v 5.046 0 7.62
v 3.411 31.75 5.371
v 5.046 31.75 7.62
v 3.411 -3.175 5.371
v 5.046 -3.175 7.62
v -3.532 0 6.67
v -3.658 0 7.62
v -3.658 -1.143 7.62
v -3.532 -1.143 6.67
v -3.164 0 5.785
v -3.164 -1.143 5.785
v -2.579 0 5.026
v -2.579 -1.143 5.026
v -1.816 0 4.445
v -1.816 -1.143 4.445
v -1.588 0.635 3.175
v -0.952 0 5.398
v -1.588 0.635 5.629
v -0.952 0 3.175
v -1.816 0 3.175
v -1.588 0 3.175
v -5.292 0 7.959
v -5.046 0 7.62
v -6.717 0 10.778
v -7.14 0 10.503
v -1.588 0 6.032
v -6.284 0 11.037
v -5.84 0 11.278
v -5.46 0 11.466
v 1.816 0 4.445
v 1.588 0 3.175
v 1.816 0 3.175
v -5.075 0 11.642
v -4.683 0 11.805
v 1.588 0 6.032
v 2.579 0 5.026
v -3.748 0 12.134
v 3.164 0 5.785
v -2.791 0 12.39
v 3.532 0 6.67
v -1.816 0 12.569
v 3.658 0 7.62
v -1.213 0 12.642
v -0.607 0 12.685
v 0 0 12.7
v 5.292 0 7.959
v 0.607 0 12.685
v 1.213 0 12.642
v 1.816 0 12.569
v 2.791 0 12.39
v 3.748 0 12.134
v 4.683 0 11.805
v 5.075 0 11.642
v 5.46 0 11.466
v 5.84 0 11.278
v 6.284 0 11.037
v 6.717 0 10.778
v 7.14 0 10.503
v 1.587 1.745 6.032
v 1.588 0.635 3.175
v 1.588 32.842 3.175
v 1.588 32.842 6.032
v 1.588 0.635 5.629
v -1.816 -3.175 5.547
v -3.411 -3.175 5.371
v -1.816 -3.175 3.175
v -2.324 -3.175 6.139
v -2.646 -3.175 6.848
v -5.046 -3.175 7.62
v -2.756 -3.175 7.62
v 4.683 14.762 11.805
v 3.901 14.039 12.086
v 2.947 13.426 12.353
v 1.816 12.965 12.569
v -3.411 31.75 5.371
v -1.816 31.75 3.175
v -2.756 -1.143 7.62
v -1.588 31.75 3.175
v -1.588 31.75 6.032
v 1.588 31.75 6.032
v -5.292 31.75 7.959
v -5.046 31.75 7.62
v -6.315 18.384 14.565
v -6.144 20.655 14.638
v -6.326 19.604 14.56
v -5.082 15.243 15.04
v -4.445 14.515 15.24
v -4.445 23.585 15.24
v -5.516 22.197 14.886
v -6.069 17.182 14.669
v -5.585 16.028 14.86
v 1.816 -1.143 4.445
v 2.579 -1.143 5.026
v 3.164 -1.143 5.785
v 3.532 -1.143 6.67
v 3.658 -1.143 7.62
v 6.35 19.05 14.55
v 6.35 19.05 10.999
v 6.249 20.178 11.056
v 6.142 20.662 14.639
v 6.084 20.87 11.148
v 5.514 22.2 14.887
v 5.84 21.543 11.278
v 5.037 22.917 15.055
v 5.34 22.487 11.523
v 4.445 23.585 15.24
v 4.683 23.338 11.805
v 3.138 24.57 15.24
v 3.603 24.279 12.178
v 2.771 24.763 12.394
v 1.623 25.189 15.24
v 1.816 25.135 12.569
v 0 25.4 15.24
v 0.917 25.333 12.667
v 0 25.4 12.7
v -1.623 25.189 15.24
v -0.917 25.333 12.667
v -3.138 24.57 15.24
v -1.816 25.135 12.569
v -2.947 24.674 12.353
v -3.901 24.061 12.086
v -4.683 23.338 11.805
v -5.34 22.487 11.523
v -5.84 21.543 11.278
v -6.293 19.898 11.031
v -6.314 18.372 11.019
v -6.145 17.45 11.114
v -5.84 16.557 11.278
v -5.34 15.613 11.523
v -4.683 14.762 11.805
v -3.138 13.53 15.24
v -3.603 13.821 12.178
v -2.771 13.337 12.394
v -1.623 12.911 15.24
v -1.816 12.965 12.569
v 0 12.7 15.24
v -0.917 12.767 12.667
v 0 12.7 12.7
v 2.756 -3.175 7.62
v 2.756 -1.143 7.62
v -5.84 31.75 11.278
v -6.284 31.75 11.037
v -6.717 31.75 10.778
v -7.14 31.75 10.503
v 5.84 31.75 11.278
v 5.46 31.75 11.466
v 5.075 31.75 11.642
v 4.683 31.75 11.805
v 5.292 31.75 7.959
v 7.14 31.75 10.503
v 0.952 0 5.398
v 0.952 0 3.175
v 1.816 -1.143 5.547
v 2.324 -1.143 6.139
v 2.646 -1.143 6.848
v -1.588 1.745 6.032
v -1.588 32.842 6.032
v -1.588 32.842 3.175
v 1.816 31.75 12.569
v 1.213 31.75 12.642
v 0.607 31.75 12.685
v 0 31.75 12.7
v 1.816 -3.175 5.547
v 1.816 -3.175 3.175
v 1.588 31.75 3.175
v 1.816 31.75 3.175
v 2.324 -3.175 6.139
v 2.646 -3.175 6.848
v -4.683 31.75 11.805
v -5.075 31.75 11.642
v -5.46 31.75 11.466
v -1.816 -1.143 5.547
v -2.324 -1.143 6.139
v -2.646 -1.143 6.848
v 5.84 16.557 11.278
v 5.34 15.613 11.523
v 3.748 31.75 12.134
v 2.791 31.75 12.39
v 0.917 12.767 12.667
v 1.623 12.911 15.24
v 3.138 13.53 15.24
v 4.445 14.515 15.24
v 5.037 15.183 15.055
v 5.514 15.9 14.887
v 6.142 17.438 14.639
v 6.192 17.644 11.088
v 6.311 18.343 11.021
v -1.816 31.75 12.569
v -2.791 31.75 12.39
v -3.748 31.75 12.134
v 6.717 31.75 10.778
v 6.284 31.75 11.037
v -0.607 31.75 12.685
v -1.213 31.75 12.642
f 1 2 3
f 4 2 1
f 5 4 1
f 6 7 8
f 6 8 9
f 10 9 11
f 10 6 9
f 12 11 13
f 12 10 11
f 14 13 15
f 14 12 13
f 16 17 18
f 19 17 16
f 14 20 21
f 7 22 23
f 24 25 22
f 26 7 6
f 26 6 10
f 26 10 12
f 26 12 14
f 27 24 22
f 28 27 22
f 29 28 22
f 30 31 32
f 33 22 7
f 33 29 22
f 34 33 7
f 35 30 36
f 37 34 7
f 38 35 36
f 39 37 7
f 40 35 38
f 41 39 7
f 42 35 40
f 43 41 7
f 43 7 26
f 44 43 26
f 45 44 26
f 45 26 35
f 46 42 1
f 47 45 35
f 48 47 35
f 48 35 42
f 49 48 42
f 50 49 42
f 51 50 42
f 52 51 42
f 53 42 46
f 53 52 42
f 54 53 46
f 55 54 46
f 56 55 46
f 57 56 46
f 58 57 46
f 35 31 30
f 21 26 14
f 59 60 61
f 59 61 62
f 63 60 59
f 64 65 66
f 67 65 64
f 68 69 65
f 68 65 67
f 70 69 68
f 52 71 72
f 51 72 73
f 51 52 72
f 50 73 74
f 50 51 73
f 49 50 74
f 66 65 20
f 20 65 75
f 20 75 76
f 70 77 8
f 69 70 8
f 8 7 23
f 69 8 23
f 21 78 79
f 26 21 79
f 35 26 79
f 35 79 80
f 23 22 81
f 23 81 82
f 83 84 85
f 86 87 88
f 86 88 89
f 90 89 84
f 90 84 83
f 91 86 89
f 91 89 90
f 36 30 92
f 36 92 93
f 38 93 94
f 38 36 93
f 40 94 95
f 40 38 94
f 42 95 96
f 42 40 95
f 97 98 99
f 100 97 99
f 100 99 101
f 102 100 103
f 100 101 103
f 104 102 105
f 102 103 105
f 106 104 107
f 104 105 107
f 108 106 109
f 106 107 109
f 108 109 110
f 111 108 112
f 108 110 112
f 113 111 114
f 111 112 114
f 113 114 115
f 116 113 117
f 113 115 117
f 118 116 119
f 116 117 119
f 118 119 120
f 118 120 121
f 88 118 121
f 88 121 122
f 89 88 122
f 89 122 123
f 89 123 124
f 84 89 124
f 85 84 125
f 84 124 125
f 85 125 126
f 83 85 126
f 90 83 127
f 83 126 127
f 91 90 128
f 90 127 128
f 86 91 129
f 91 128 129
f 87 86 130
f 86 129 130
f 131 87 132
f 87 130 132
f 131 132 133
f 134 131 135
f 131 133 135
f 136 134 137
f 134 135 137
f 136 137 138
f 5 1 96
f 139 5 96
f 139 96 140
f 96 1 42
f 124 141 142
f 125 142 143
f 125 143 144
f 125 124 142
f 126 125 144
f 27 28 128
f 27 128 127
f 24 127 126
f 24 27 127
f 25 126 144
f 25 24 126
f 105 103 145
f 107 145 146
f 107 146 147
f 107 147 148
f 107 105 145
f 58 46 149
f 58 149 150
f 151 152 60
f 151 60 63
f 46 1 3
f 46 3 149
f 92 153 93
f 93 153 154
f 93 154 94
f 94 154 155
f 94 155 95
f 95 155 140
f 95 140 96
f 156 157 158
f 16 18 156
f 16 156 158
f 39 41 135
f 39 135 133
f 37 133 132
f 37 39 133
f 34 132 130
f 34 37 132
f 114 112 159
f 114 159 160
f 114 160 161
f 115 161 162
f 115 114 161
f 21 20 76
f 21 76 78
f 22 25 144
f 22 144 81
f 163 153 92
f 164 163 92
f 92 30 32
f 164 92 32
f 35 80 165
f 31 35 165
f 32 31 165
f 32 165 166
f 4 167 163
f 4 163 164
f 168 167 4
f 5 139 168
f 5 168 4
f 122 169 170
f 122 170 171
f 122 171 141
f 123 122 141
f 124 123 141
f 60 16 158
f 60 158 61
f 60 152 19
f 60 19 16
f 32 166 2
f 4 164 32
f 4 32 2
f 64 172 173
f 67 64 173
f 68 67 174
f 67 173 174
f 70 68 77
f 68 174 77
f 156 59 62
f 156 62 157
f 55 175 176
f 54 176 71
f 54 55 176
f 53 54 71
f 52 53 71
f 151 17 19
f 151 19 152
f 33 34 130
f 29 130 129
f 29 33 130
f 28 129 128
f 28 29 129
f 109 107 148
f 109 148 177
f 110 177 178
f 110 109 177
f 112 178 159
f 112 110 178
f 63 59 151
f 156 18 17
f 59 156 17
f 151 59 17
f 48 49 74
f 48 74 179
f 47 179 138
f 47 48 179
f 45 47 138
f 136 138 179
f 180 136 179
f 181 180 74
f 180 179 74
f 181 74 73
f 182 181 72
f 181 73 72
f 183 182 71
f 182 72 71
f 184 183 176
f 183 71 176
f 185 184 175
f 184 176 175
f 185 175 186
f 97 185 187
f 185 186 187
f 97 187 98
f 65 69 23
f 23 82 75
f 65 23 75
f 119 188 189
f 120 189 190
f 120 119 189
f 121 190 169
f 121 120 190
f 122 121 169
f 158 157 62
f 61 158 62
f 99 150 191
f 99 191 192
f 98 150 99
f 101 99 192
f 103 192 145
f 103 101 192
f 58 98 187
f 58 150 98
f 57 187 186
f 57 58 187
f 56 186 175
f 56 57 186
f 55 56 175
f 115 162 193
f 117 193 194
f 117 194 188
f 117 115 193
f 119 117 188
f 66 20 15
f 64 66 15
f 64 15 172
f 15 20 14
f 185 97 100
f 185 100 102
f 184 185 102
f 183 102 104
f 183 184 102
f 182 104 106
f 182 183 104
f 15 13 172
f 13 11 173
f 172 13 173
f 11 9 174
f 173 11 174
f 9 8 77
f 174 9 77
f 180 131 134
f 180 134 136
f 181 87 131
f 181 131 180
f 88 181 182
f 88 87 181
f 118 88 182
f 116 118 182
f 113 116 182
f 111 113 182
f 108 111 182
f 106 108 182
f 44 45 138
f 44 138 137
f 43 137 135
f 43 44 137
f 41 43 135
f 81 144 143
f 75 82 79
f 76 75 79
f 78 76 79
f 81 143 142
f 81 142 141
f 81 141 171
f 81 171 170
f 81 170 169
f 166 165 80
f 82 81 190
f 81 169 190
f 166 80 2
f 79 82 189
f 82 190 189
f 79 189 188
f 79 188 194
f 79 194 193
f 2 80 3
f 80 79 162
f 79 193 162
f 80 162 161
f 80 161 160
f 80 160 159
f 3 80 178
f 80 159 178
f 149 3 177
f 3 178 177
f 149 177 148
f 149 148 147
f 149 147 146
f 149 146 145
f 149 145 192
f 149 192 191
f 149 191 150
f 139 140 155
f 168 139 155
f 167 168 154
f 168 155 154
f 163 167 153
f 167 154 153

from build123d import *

# Parameters (mm, degrees)
F1_DEPTH     = 31.75
F2_DEPTH     = 3.175
F3_DEPTH     = 1.143
F4_DEPTH     = 32.8422
F7_DEPTH     = 5.08
F8_R         = 19.05
F8_R_2       = 15.875
F9_DEPTH     = 50.8
F11_SIZE     = 0.635
F12_T1_DEPTH = 10.9569141407


# Not quite as in the source:
# - a fillet or chamfer that OpenCascade refuses, or shapes differently, is made with other operations: its cross-section is extruded or revolved along the edge and cut away or added


with BuildPart() as f1:
    # F0 (on Front) → F1 (new body)
    with BuildSketch(Plane.XZ):
        with BuildLine():
            Line((-3.96875, 7.62), (-5.0456895848, 7.62))
            Line((-5.0456895848, 7.62), (-3.4113577324, 5.3705351863))
            Line((-3.4113577324, 5.3705351863), (-1.8162080478, 3.175))
            Line((-1.8162080478, 3.175), (-1.8162080478, 4.0912091463))
            ThreePointArc((-1.8162080478, 4.0912091463), (-3.3881449388, 5.5532512402), (-3.96875, 7.62))
        make_face()
        with BuildLine():
            Line((-5.2922131397, 7.9593105639), (-5.0456895848, 7.62))
            Line((-5.0456895848, 7.62), (-3.96875, 7.62))
            ThreePointArc((-3.96875, 7.62), (-3.3881449388, 9.6867487598), (-1.8162080478, 11.1487908537))
            Line((-1.8162080478, 11.1487908537), (-1.8162080478, 11.2776))
            Line((-1.8162080478, 11.2776), (-4.4524904002, 11.2776))
            ThreePointArc((-4.4524904002, 11.2776), (-4.386898372, 9.4956069696), (-5.2922131397, 7.9593105639))
        make_face()
        with BuildLine():
            Line((-1.8162080478, 4.0912091463), (-1.8162080478, 3.175))
            Line((-1.8162080478, 3.175), (-1.5875, 3.175))
            Line((-1.5875, 3.175), (-1.5875, 3.9825805421))
            ThreePointArc((-1.5875, 3.9825805421), (-1.7027205179, 4.0350705167), (-1.8162080478, 4.0912091463))
        make_face()
        with BuildLine():
            Line((3.96875, 7.62), (5.0456895848, 7.62))
            Line((5.0456895848, 7.62), (5.2922131397, 7.9593105639))
            ThreePointArc((5.2922131397, 7.9593105639), (4.386898372, 9.4956069696), (4.4524904002, 11.2776))
            Line((4.4524904002, 11.2776), (1.8162080478, 11.2776))
            Line((1.8162080478, 11.2776), (1.8162080478, 11.1487908537))
            ThreePointArc((1.8162080478, 11.1487908537), (3.3881449388, 9.6867487598), (3.96875, 7.62))
        make_face()
        with BuildLine():
            Line((3.4113577324, 5.3705351863), (5.0456895848, 7.62))
            Line((5.0456895848, 7.62), (3.96875, 7.62))
            ThreePointArc((3.96875, 7.62), (3.3881449388, 5.5532512402), (1.8162080478, 4.0912091463))
            Line((1.8162080478, 4.0912091463), (1.8162080478, 3.175))
            Line((1.8162080478, 3.175), (3.4113577324, 5.3705351863))
        make_face()
        with BuildLine():
            Line((1.5875, 3.175), (1.8162080478, 3.175))
            Line((1.8162080478, 3.175), (1.8162080478, 4.0912091463))
            ThreePointArc((1.8162080478, 4.0912091463), (1.7027205179, 4.0350705167), (1.5875, 3.9825805421))
            Line((1.5875, 3.9825805421), (1.5875, 3.175))
        make_face()
        with BuildLine():
            Line((-7.1401482368, 10.5027750217), (-5.2922131397, 7.9593105639))
            ThreePointArc((-5.2922131397, 7.9593105639), (-4.386898372, 9.4956069696), (-4.4524904002, 11.2776))
            Line((-4.4524904002, 11.2776), (-5.8400118356, 11.2776))
            ThreePointArc((-5.8400118356, 11.2776), (-6.5016326652, 10.9095725254), (-7.1401482368, 10.5027750217))
        make_face()
        with BuildLine():
            Line((-3.6576, 7.62), (-3.96875, 7.62))
            ThreePointArc((-3.96875, 7.62), (-3.3881449388, 5.5532512402), (-1.8162080478, 4.0912091463))
            Line((-1.8162080478, 4.0912091463), (-1.8162080478, 4.4451888108))
            ThreePointArc((-1.8162080478, 4.4451888108), (-3.1639374453, 5.7849148243), (-3.6576, 7.62))
        make_face()
        with BuildLine():
            ThreePointArc((-1.8162080478, 11.1487908537), (-3.3881449388, 9.6867487598), (-3.96875, 7.62))
            Line((-3.96875, 7.62), (-3.6576, 7.62))
            ThreePointArc((-3.6576, 7.62), (-3.1639374453, 9.4550851757), (-1.8162080478, 10.7948111892))
            Line((-1.8162080478, 10.7948111892), (-1.8162080478, 11.1487908537))
        make_face()
        with BuildLine():
            Line((-1.8162080478, 4.4451888108), (-1.8162080478, 4.0912091463))
            ThreePointArc((-1.8162080478, 4.0912091463), (-1.7027205179, 4.0350705167), (-1.5875, 3.9825805421))
            Line((-1.5875, 3.9825805421), (-1.5875, 4.3248700314))
            ThreePointArc((-1.5875, 4.3248700314), (-1.7029169889, 4.3830088834), (-1.8162080478, 4.4451888108))
        make_face()
        with BuildLine():
            ThreePointArc((4.4524904002, 11.2776), (4.386898372, 9.4956069696), (5.2922131397, 7.9593105639))
            Line((5.2922131397, 7.9593105639), (7.1401482368, 10.5027750217))
            ThreePointArc((7.1401482368, 10.5027750217), (6.5016326652, 10.9095725254), (5.8400118356, 11.2776))
            Line((5.8400118356, 11.2776), (4.4524904002, 11.2776))
        make_face()
        with BuildLine():
            Line((3.6576, 7.62), (3.96875, 7.62))
            ThreePointArc((3.96875, 7.62), (3.3881449388, 9.6867487598), (1.8162080478, 11.1487908537))
            Line((1.8162080478, 11.1487908537), (1.8162080478, 10.7948111892))
            ThreePointArc((1.8162080478, 10.7948111892), (3.1639374453, 9.4550851757), (3.6576, 7.62))
        make_face()
        with BuildLine():
            ThreePointArc((1.8162080478, 4.0912091463), (3.3881449388, 5.5532512402), (3.96875, 7.62))
            Line((3.96875, 7.62), (3.6576, 7.62))
            ThreePointArc((3.6576, 7.62), (3.1639374453, 5.7849148243), (1.8162080478, 4.4451888108))
            Line((1.8162080478, 4.4451888108), (1.8162080478, 4.0912091463))
        make_face()
        with BuildLine():
            ThreePointArc((1.5875, 3.9825805421), (1.7027205179, 4.0350705167), (1.8162080478, 4.0912091463))
            Line((1.8162080478, 4.0912091463), (1.8162080478, 4.4451888108))
            ThreePointArc((1.8162080478, 4.4451888108), (1.7029169889, 4.3830088834), (1.5875, 4.3248700314))
            Line((1.5875, 4.3248700314), (1.5875, 3.9825805421))
        make_face()
        with BuildLine():
            ThreePointArc((-4.6831128955, 11.8050181537), (-4.5558242029, 11.5465464169), (-4.4524904002, 11.2776))
            Line((-4.4524904002, 11.2776), (-1.8162080478, 11.2776))
            Line((-1.8162080478, 11.2776), (-1.8162080478, 12.5694625313))
            ThreePointArc((-1.8162080478, 12.5694625313), (-3.2720615799, 12.2712514854), (-4.6831128955, 11.8050181537))
        make_face()
        with BuildLine():
            Line((-5.8400118356, 11.2776), (-4.4524904002, 11.2776))
            ThreePointArc((-4.4524904002, 11.2776), (-4.5558242029, 11.5465464169), (-4.6831128955, 11.8050181537))
            ThreePointArc((-4.6831128955, 11.8050181537), (-5.2681667593, 11.5557959049), (-5.8400118356, 11.2776))
        make_face()
        with BuildLine():
            Line((-1.8162080478, 11.2776), (-1.8162080478, 11.1487908537))
            ThreePointArc((-1.8162080478, 11.1487908537), (-1.6795566201, 11.2158401136), (-1.5404346148, 11.2776))
            Line((-1.5404346148, 11.2776), (-1.8162080478, 11.2776))
        make_face()
        with BuildLine():
            ThreePointArc((-1.5404346148, 11.2776), (-1.6795566201, 11.2158401136), (-1.8162080478, 11.1487908537))
            Line((-1.8162080478, 11.1487908537), (-1.8162080478, 10.7948111892))
            ThreePointArc((-1.8162080478, 10.7948111892), (-0.939640451, 11.1548427946), (0, 11.2776))
            Line((0, 11.2776), (-1.5404346148, 11.2776))
        make_face()
        with BuildLine():
            Line((-2.7559, 7.62), (-3.6576, 7.62))
            ThreePointArc((-3.6576, 7.62), (-3.1639374453, 5.7849148243), (-1.8162080478, 4.4451888108))
            Line((-1.8162080478, 4.4451888108), (-1.8162080478, 5.5472305635))
            ThreePointArc((-1.8162080478, 5.5472305635), (-2.510007228, 6.4820858884), (-2.7559, 7.62))
        make_face()
        with BuildLine():
            ThreePointArc((-1.8162080478, 10.7948111892), (-3.1639374453, 9.4550851757), (-3.6576, 7.62))
            Line((-3.6576, 7.62), (-2.7559, 7.62))
            ThreePointArc((-2.7559, 7.62), (-2.510007228, 8.7579141116), (-1.8162080478, 9.6927694365))
            Line((-1.8162080478, 9.6927694365), (-1.8162080478, 10.7948111892))
        make_face()
        with BuildLine():
            Line((-1.8162080478, 5.5472305635), (-1.8162080478, 4.4451888108))
            ThreePointArc((-1.8162080478, 4.4451888108), (-1.7029169889, 4.3830088834), (-1.5875, 4.3248700314))
            Line((-1.5875, 4.3248700314), (-1.5875, 5.3672619859))
            ThreePointArc((-1.5875, 5.3672619859), (-1.7042312903, 5.454225192), (-1.8162080478, 5.5472305635))
        make_face()
        with BuildLine():
            ThreePointArc((4.6831128955, 11.8050181537), (4.5558242029, 11.5465464169), (4.4524904002, 11.2776))
            Line((4.4524904002, 11.2776), (5.8400118356, 11.2776))
            ThreePointArc((5.8400118356, 11.2776), (5.2681667593, 11.5557959049), (4.6831128955, 11.8050181537))
        make_face()
        with BuildLine():
            Line((1.8162080478, 11.2776), (4.4524904002, 11.2776))
            ThreePointArc((4.4524904002, 11.2776), (4.5558242029, 11.5465464169), (4.6831128955, 11.8050181537))
            ThreePointArc((4.6831128955, 11.8050181537), (3.2720615799, 12.2712514854), (1.8162080478, 12.5694625313))
            Line((1.8162080478, 12.5694625313), (1.8162080478, 11.2776))
        make_face()
        with BuildLine():
            Line((1.8162080478, 10.7948111892), (1.8162080478, 11.1487908537))
            ThreePointArc((1.8162080478, 11.1487908537), (1.6795566201, 11.2158401136), (1.5404346148, 11.2776))
            Line((1.5404346148, 11.2776), (0, 11.2776))
            ThreePointArc((0, 11.2776), (0.939640451, 11.1548427946), (1.8162080478, 10.7948111892))
        make_face()
        with BuildLine():
            ThreePointArc((1.5404346148, 11.2776), (1.6795566201, 11.2158401136), (1.8162080478, 11.1487908537))
            Line((1.8162080478, 11.1487908537), (1.8162080478, 11.2776))
            Line((1.8162080478, 11.2776), (1.5404346148, 11.2776))
        make_face()
        with BuildLine():
            Line((2.7559, 7.62), (3.6576, 7.62))
            ThreePointArc((3.6576, 7.62), (3.1639374453, 9.4550851757), (1.8162080478, 10.7948111892))
            Line((1.8162080478, 10.7948111892), (1.8162080478, 9.6927694365))
            ThreePointArc((1.8162080478, 9.6927694365), (2.510007228, 8.7579141116), (2.7559, 7.62))
        make_face()
        with BuildLine():
            ThreePointArc((1.8162080478, 4.4451888108), (3.1639374453, 5.7849148243), (3.6576, 7.62))
            Line((3.6576, 7.62), (2.7559, 7.62))
            ThreePointArc((2.7559, 7.62), (2.510007228, 6.4820858884), (1.8162080478, 5.5472305635))
            Line((1.8162080478, 5.5472305635), (1.8162080478, 4.4451888108))
        make_face()
        with BuildLine():
            ThreePointArc((1.5875, 4.3248700314), (1.7029169889, 4.3830088834), (1.8162080478, 4.4451888108))
            Line((1.8162080478, 4.4451888108), (1.8162080478, 5.5472305635))
            ThreePointArc((1.8162080478, 5.5472305635), (1.7042312903, 5.454225192), (1.5875, 5.3672619859))
            Line((1.5875, 5.3672619859), (1.5875, 4.3248700314))
        make_face()
        with BuildLine():
            Line((-1.8162080478, 12.5694625313), (-1.8162080478, 11.2776))
            Line((-1.8162080478, 11.2776), (-1.5404346148, 11.2776))
            ThreePointArc((-1.5404346148, 11.2776), (-0.7857724106, 11.5101848647), (0, 11.58875))
            Line((0, 11.58875), (0, 12.7))
            ThreePointArc((0, 12.7), (-0.910446553, 12.6673235955), (-1.8162080478, 12.5694625313))
        make_face()
        with BuildLine():
            ThreePointArc((0, 11.58875), (-0.7857724106, 11.5101848647), (-1.5404346148, 11.2776))
            Line((-1.5404346148, 11.2776), (0, 11.2776))
            Line((0, 11.2776), (0, 11.58875))
        make_face()
        with BuildLine():
            ThreePointArc((0, 11.2776), (-0.939640451, 11.1548427946), (-1.8162080478, 10.7948111892))
            Line((-1.8162080478, 10.7948111892), (-1.8162080478, 9.6927694365))
            ThreePointArc((-1.8162080478, 9.6927694365), (-0.970216347, 10.1994699165), (0, 10.3759))
            Line((0, 10.3759), (0, 11.2776))
        make_face()
        with BuildLine():
            Line((-1.8162080478, 7.62), (-2.7559, 7.62))
            ThreePointArc((-2.7559, 7.62), (-2.510007228, 6.4820858884), (-1.8162080478, 5.5472305635))
            Line((-1.8162080478, 5.5472305635), (-1.8162080478, 6.0325))
            Line((-1.8162080478, 6.0325), (-1.8162080478, 7.62))
        make_face()
        with BuildLine():
            ThreePointArc((-1.8162080478, 9.6927694365), (-2.510007228, 8.7579141116), (-2.7559, 7.62))
            Line((-2.7559, 7.62), (-1.8162080478, 7.62))
            Line((-1.8162080478, 7.62), (-1.8162080478, 9.525))
            Line((-1.8162080478, 9.525), (-1.8162080478, 9.6927694365))
        make_face()
        with BuildLine():
            Line((-1.8162080478, 6.0325), (-1.8162080478, 5.5472305635))
            ThreePointArc((-1.8162080478, 5.5472305635), (-1.7042312903, 5.454225192), (-1.5875, 5.3672619859))
            Line((-1.5875, 5.3672619859), (-1.5875, 6.0325))
            Line((-1.5875, 6.0325), (-1.8162080478, 6.0325))
        make_face()
        with BuildLine():
            Line((1.5404346148, 11.2776), (1.8162080478, 11.2776))
            Line((1.8162080478, 11.2776), (1.8162080478, 12.5694625313))
            ThreePointArc((1.8162080478, 12.5694625313), (0.910446553, 12.6673235955), (0, 12.7))
            Line((0, 12.7), (0, 11.58875))
            ThreePointArc((0, 11.58875), (0.7857724106, 11.5101848647), (1.5404346148, 11.2776))
        make_face()
        with BuildLine():
            Line((0, 11.2776), (1.5404346148, 11.2776))
            ThreePointArc((1.5404346148, 11.2776), (0.7857724106, 11.5101848647), (0, 11.58875))
            Line((0, 11.58875), (0, 11.2776))
        make_face()
        with BuildLine():
            Line((1.8162080478, 9.6927694365), (1.8162080478, 10.7948111892))
            ThreePointArc((1.8162080478, 10.7948111892), (0.939640451, 11.1548427946), (0, 11.2776))
            Line((0, 11.2776), (0, 10.3759))
            ThreePointArc((0, 10.3759), (0.970216347, 10.1994699165), (1.8162080478, 9.6927694365))
        make_face()
        with BuildLine():
            Line((1.8162080478, 7.62), (2.7559, 7.62))
            ThreePointArc((2.7559, 7.62), (2.510007228, 8.7579141116), (1.8162080478, 9.6927694365))
            Line((1.8162080478, 9.6927694365), (1.8162080478, 9.525))
            Line((1.8162080478, 9.525), (1.8162080478, 7.62))
        make_face()
        with BuildLine():
            ThreePointArc((1.8162080478, 5.5472305635), (2.510007228, 6.4820858884), (2.7559, 7.62))
            Line((2.7559, 7.62), (1.8162080478, 7.62))
            Line((1.8162080478, 7.62), (1.8162080478, 6.0325))
            Line((1.8162080478, 6.0325), (1.8162080478, 5.5472305635))
        make_face()
        with BuildLine():
            ThreePointArc((1.5875, 5.3672619859), (1.7042312903, 5.454225192), (1.8162080478, 5.5472305635))
            Line((1.8162080478, 5.5472305635), (1.8162080478, 6.0325))
            Line((1.8162080478, 6.0325), (1.5875, 6.0325))
            Line((1.5875, 6.0325), (1.5875, 5.3672619859))
        make_face()
        Polygon((-1.5875, 6.0325), (0, 6.0325), (1.5875, 6.0325), (1.8162080478, 6.0325), (1.8162080478, 7.62), (0, 7.62), (-1.8162080478, 7.62), (-1.8162080478, 6.0325), align=None)
        with BuildLine():
            ThreePointArc((0, 10.3759), (-0.970216347, 10.1994699165), (-1.8162080478, 9.6927694365))
            Line((-1.8162080478, 9.6927694365), (-1.8162080478, 9.525))
            Line((-1.8162080478, 9.525), (0, 9.525))
            Line((0, 9.525), (0, 10.3759))
        make_face()
        Polygon((-1.8162080478, 9.525), (-1.8162080478, 7.62), (0, 7.62), (1.8162080478, 7.62), (1.8162080478, 9.525), (0, 9.525), align=None)
        with BuildLine():
            Line((1.8162080478, 9.525), (1.8162080478, 9.6927694365))
            ThreePointArc((1.8162080478, 9.6927694365), (0.970216347, 10.1994699165), (0, 10.3759))
            Line((0, 10.3759), (0, 9.525))
            Line((0, 9.525), (1.8162080478, 9.525))
        make_face()
    extrude(amount=-F1_DEPTH)

    # F0 (on Front) → F2 (join)
    with BuildSketch(Plane.XZ):
        with BuildLine():
            Line((-3.96875, 7.62), (-5.0456895848, 7.62))
            Line((-5.0456895848, 7.62), (-3.4113577324, 5.3705351863))
            Line((-3.4113577324, 5.3705351863), (-1.8162080478, 3.175))
            Line((-1.8162080478, 3.175), (-1.8162080478, 4.0912091463))
            ThreePointArc((-1.8162080478, 4.0912091463), (-3.3881449388, 5.5532512402), (-3.96875, 7.62))
        make_face()
        with BuildLine():
            Line((3.4113577324, 5.3705351863), (5.0456895848, 7.62))
            Line((5.0456895848, 7.62), (3.96875, 7.62))
            ThreePointArc((3.96875, 7.62), (3.3881449388, 5.5532512402), (1.8162080478, 4.0912091463))
            Line((1.8162080478, 4.0912091463), (1.8162080478, 3.175))
            Line((1.8162080478, 3.175), (3.4113577324, 5.3705351863))
        make_face()
        with BuildLine():
            Line((-3.6576, 7.62), (-3.96875, 7.62))
            ThreePointArc((-3.96875, 7.62), (-3.3881449388, 5.5532512402), (-1.8162080478, 4.0912091463))
            Line((-1.8162080478, 4.0912091463), (-1.8162080478, 4.4451888108))
            ThreePointArc((-1.8162080478, 4.4451888108), (-3.1639374453, 5.7849148243), (-3.6576, 7.62))
        make_face()
        with BuildLine():
            ThreePointArc((1.8162080478, 4.0912091463), (3.3881449388, 5.5532512402), (3.96875, 7.62))
            Line((3.96875, 7.62), (3.6576, 7.62))
            ThreePointArc((3.6576, 7.62), (3.1639374453, 5.7849148243), (1.8162080478, 4.4451888108))
            Line((1.8162080478, 4.4451888108), (1.8162080478, 4.0912091463))
        make_face()
        with BuildLine():
            Line((-2.7559, 7.62), (-3.6576, 7.62))
            ThreePointArc((-3.6576, 7.62), (-3.1639374453, 5.7849148243), (-1.8162080478, 4.4451888108))
            Line((-1.8162080478, 4.4451888108), (-1.8162080478, 5.5472305635))
            ThreePointArc((-1.8162080478, 5.5472305635), (-2.510007228, 6.4820858884), (-2.7559, 7.62))
        make_face()
        with BuildLine():
            ThreePointArc((1.8162080478, 4.4451888108), (3.1639374453, 5.7849148243), (3.6576, 7.62))
            Line((3.6576, 7.62), (2.7559, 7.62))
            ThreePointArc((2.7559, 7.62), (2.510007228, 6.4820858884), (1.8162080478, 5.5472305635))
            Line((1.8162080478, 5.5472305635), (1.8162080478, 4.4451888108))
        make_face()
    extrude(amount=F2_DEPTH)

    # F0 (on Front) → F3 (cut)
    with BuildSketch(Plane.XZ):
        with BuildLine():
            Line((-2.7559, 7.62), (-3.6576, 7.62))
            ThreePointArc((-3.6576, 7.62), (-3.1639374453, 5.7849148243), (-1.8162080478, 4.4451888108))
            Line((-1.8162080478, 4.4451888108), (-1.8162080478, 5.5472305635))
            ThreePointArc((-1.8162080478, 5.5472305635), (-2.510007228, 6.4820858884), (-2.7559, 7.62))
        make_face()
        with BuildLine():
            ThreePointArc((1.8162080478, 4.4451888108), (3.1639374453, 5.7849148243), (3.6576, 7.62))
            Line((3.6576, 7.62), (2.7559, 7.62))
            ThreePointArc((2.7559, 7.62), (2.510007228, 6.4820858884), (1.8162080478, 5.5472305635))
            Line((1.8162080478, 5.5472305635), (1.8162080478, 4.4451888108))
        make_face()
        with BuildLine():
            Line((1.8162080478, 9.6927694365), (1.8162080478, 10.7948111892))
            ThreePointArc((1.8162080478, 10.7948111892), (0.939640451, 11.1548427946), (0, 11.2776))
            Line((0, 11.2776), (0, 10.3759))
            ThreePointArc((0, 10.3759), (0.970216347, 10.1994699165), (1.8162080478, 9.6927694365))
        make_face()
    extrude(amount=F3_DEPTH, mode=Mode.SUBTRACT)

    # F6 (on offset) → F7 (join)
    with BuildSketch(Plane.XY.offset(10.16)):
        with BuildLine():
            ThreePointArc((0, 12.7), (4.4901280605, 14.5598719395), (6.35, 19.05))
            ThreePointArc((6.35, 19.05), (-4.4901280605, 23.5401280605), (0, 12.7))
        make_face()
    extrude(amount=F7_DEPTH)

    # F8 (on Front) → F9 (cut)
    with BuildSketch(Plane.XZ):
        Circle(F8_R)
        Circle(F8_R_2, mode=Mode.SUBTRACT)
    extrude(amount=-F9_DEPTH, mode=Mode.SUBTRACT)


with BuildPart() as f4:
    # F0 (on Front) → F4 (new body)
    with BuildSketch(Plane.XZ):
        with BuildLine():
            ThreePointArc((-1.5875, 5.3672619859), (-0.8326656343, 4.9929003157), (0, 4.8641))
            Line((0, 4.8641), (0, 6.0325))
            Line((0, 6.0325), (-1.5875, 6.0325))
            Line((-1.5875, 6.0325), (-1.5875, 5.3672619859))
        make_face()
        with BuildLine():
            Line((0, 6.0325), (0, 4.8641))
            ThreePointArc((0, 4.8641), (0.8326656343, 4.9929003157), (1.5875, 5.3672619859))
            Line((1.5875, 5.3672619859), (1.5875, 6.0325))
            Line((1.5875, 6.0325), (0, 6.0325))
        make_face()
        with BuildLine():
            Line((0, 4.8641), (0, 3.9624))
            ThreePointArc((0, 3.9624), (0.8141776179, 4.0541687412), (1.5875, 4.3248700314))
            Line((1.5875, 4.3248700314), (1.5875, 5.3672619859))
            ThreePointArc((1.5875, 5.3672619859), (0.8326656343, 4.9929003157), (0, 4.8641))
        make_face()
        with BuildLine():
            ThreePointArc((-1.5875, 4.3248700314), (-0.8141776179, 4.0541687412), (0, 3.9624))
            Line((0, 3.9624), (0, 4.8641))
            ThreePointArc((0, 4.8641), (-0.8326656343, 4.9929003157), (-1.5875, 5.3672619859))
            Line((-1.5875, 5.3672619859), (-1.5875, 4.3248700314))
        make_face()
        with BuildLine():
            ThreePointArc((-1.5875, 3.9825805421), (-0.8108538984, 3.7349655706), (0, 3.65125))
            Line((0, 3.65125), (0, 3.9624))
            ThreePointArc((0, 3.9624), (-0.8141776179, 4.0541687412), (-1.5875, 4.3248700314))
            Line((-1.5875, 4.3248700314), (-1.5875, 3.9825805421))
        make_face()
        with BuildLine():
            Line((0, 3.9624), (0, 3.65125))
            ThreePointArc((0, 3.65125), (0.8108538984, 3.7349655706), (1.5875, 3.9825805421))
            Line((1.5875, 3.9825805421), (1.5875, 4.3248700314))
            ThreePointArc((1.5875, 4.3248700314), (0.8141776179, 4.0541687412), (0, 3.9624))
        make_face()
        with BuildLine():
            Line((0, 3.65125), (0, 3.175))
            Line((0, 3.175), (0.79375, 3.175))
            Line((0.79375, 3.175), (1.5875, 3.175))
            Line((1.5875, 3.175), (1.5875, 3.9825805421))
            ThreePointArc((1.5875, 3.9825805421), (0.8108538984, 3.7349655706), (0, 3.65125))
        make_face()
        with BuildLine():
            Line((-0.79375, 3.175), (0, 3.175))
            Line((0, 3.175), (0, 3.65125))
            ThreePointArc((0, 3.65125), (-0.8108538984, 3.7349655706), (-1.5875, 3.9825805421))
            Line((-1.5875, 3.9825805421), (-1.5875, 3.175))
            Line((-1.5875, 3.175), (-0.79375, 3.175))
        make_face()
    extrude(amount=-F4_DEPTH)

    # F11
    f11_edges = [f4.edges().sort_by_distance(p)[0] for p in [
        (-1.5875, 0, 4.60375),
        (1.5875, 0, 4.60375),
    ]]
    chamfer(f11_edges, length=F11_SIZE)

    # F12: chamfer of 0.635 x 1.7446481614 on 1 edges, made by hand

    # F12_s2 → F12_t1 (cut)
    with BuildSketch(Plane.YZ.offset(-5.4784570703)):
        Polygon((1.7446481614, 6.0325), (0, 5.3975), (0, 6.0325), align=None)
    extrude(amount=F12_T1_DEPTH, mode=Mode.SUBTRACT)


solid = Compound([f1.part, f4.part])
